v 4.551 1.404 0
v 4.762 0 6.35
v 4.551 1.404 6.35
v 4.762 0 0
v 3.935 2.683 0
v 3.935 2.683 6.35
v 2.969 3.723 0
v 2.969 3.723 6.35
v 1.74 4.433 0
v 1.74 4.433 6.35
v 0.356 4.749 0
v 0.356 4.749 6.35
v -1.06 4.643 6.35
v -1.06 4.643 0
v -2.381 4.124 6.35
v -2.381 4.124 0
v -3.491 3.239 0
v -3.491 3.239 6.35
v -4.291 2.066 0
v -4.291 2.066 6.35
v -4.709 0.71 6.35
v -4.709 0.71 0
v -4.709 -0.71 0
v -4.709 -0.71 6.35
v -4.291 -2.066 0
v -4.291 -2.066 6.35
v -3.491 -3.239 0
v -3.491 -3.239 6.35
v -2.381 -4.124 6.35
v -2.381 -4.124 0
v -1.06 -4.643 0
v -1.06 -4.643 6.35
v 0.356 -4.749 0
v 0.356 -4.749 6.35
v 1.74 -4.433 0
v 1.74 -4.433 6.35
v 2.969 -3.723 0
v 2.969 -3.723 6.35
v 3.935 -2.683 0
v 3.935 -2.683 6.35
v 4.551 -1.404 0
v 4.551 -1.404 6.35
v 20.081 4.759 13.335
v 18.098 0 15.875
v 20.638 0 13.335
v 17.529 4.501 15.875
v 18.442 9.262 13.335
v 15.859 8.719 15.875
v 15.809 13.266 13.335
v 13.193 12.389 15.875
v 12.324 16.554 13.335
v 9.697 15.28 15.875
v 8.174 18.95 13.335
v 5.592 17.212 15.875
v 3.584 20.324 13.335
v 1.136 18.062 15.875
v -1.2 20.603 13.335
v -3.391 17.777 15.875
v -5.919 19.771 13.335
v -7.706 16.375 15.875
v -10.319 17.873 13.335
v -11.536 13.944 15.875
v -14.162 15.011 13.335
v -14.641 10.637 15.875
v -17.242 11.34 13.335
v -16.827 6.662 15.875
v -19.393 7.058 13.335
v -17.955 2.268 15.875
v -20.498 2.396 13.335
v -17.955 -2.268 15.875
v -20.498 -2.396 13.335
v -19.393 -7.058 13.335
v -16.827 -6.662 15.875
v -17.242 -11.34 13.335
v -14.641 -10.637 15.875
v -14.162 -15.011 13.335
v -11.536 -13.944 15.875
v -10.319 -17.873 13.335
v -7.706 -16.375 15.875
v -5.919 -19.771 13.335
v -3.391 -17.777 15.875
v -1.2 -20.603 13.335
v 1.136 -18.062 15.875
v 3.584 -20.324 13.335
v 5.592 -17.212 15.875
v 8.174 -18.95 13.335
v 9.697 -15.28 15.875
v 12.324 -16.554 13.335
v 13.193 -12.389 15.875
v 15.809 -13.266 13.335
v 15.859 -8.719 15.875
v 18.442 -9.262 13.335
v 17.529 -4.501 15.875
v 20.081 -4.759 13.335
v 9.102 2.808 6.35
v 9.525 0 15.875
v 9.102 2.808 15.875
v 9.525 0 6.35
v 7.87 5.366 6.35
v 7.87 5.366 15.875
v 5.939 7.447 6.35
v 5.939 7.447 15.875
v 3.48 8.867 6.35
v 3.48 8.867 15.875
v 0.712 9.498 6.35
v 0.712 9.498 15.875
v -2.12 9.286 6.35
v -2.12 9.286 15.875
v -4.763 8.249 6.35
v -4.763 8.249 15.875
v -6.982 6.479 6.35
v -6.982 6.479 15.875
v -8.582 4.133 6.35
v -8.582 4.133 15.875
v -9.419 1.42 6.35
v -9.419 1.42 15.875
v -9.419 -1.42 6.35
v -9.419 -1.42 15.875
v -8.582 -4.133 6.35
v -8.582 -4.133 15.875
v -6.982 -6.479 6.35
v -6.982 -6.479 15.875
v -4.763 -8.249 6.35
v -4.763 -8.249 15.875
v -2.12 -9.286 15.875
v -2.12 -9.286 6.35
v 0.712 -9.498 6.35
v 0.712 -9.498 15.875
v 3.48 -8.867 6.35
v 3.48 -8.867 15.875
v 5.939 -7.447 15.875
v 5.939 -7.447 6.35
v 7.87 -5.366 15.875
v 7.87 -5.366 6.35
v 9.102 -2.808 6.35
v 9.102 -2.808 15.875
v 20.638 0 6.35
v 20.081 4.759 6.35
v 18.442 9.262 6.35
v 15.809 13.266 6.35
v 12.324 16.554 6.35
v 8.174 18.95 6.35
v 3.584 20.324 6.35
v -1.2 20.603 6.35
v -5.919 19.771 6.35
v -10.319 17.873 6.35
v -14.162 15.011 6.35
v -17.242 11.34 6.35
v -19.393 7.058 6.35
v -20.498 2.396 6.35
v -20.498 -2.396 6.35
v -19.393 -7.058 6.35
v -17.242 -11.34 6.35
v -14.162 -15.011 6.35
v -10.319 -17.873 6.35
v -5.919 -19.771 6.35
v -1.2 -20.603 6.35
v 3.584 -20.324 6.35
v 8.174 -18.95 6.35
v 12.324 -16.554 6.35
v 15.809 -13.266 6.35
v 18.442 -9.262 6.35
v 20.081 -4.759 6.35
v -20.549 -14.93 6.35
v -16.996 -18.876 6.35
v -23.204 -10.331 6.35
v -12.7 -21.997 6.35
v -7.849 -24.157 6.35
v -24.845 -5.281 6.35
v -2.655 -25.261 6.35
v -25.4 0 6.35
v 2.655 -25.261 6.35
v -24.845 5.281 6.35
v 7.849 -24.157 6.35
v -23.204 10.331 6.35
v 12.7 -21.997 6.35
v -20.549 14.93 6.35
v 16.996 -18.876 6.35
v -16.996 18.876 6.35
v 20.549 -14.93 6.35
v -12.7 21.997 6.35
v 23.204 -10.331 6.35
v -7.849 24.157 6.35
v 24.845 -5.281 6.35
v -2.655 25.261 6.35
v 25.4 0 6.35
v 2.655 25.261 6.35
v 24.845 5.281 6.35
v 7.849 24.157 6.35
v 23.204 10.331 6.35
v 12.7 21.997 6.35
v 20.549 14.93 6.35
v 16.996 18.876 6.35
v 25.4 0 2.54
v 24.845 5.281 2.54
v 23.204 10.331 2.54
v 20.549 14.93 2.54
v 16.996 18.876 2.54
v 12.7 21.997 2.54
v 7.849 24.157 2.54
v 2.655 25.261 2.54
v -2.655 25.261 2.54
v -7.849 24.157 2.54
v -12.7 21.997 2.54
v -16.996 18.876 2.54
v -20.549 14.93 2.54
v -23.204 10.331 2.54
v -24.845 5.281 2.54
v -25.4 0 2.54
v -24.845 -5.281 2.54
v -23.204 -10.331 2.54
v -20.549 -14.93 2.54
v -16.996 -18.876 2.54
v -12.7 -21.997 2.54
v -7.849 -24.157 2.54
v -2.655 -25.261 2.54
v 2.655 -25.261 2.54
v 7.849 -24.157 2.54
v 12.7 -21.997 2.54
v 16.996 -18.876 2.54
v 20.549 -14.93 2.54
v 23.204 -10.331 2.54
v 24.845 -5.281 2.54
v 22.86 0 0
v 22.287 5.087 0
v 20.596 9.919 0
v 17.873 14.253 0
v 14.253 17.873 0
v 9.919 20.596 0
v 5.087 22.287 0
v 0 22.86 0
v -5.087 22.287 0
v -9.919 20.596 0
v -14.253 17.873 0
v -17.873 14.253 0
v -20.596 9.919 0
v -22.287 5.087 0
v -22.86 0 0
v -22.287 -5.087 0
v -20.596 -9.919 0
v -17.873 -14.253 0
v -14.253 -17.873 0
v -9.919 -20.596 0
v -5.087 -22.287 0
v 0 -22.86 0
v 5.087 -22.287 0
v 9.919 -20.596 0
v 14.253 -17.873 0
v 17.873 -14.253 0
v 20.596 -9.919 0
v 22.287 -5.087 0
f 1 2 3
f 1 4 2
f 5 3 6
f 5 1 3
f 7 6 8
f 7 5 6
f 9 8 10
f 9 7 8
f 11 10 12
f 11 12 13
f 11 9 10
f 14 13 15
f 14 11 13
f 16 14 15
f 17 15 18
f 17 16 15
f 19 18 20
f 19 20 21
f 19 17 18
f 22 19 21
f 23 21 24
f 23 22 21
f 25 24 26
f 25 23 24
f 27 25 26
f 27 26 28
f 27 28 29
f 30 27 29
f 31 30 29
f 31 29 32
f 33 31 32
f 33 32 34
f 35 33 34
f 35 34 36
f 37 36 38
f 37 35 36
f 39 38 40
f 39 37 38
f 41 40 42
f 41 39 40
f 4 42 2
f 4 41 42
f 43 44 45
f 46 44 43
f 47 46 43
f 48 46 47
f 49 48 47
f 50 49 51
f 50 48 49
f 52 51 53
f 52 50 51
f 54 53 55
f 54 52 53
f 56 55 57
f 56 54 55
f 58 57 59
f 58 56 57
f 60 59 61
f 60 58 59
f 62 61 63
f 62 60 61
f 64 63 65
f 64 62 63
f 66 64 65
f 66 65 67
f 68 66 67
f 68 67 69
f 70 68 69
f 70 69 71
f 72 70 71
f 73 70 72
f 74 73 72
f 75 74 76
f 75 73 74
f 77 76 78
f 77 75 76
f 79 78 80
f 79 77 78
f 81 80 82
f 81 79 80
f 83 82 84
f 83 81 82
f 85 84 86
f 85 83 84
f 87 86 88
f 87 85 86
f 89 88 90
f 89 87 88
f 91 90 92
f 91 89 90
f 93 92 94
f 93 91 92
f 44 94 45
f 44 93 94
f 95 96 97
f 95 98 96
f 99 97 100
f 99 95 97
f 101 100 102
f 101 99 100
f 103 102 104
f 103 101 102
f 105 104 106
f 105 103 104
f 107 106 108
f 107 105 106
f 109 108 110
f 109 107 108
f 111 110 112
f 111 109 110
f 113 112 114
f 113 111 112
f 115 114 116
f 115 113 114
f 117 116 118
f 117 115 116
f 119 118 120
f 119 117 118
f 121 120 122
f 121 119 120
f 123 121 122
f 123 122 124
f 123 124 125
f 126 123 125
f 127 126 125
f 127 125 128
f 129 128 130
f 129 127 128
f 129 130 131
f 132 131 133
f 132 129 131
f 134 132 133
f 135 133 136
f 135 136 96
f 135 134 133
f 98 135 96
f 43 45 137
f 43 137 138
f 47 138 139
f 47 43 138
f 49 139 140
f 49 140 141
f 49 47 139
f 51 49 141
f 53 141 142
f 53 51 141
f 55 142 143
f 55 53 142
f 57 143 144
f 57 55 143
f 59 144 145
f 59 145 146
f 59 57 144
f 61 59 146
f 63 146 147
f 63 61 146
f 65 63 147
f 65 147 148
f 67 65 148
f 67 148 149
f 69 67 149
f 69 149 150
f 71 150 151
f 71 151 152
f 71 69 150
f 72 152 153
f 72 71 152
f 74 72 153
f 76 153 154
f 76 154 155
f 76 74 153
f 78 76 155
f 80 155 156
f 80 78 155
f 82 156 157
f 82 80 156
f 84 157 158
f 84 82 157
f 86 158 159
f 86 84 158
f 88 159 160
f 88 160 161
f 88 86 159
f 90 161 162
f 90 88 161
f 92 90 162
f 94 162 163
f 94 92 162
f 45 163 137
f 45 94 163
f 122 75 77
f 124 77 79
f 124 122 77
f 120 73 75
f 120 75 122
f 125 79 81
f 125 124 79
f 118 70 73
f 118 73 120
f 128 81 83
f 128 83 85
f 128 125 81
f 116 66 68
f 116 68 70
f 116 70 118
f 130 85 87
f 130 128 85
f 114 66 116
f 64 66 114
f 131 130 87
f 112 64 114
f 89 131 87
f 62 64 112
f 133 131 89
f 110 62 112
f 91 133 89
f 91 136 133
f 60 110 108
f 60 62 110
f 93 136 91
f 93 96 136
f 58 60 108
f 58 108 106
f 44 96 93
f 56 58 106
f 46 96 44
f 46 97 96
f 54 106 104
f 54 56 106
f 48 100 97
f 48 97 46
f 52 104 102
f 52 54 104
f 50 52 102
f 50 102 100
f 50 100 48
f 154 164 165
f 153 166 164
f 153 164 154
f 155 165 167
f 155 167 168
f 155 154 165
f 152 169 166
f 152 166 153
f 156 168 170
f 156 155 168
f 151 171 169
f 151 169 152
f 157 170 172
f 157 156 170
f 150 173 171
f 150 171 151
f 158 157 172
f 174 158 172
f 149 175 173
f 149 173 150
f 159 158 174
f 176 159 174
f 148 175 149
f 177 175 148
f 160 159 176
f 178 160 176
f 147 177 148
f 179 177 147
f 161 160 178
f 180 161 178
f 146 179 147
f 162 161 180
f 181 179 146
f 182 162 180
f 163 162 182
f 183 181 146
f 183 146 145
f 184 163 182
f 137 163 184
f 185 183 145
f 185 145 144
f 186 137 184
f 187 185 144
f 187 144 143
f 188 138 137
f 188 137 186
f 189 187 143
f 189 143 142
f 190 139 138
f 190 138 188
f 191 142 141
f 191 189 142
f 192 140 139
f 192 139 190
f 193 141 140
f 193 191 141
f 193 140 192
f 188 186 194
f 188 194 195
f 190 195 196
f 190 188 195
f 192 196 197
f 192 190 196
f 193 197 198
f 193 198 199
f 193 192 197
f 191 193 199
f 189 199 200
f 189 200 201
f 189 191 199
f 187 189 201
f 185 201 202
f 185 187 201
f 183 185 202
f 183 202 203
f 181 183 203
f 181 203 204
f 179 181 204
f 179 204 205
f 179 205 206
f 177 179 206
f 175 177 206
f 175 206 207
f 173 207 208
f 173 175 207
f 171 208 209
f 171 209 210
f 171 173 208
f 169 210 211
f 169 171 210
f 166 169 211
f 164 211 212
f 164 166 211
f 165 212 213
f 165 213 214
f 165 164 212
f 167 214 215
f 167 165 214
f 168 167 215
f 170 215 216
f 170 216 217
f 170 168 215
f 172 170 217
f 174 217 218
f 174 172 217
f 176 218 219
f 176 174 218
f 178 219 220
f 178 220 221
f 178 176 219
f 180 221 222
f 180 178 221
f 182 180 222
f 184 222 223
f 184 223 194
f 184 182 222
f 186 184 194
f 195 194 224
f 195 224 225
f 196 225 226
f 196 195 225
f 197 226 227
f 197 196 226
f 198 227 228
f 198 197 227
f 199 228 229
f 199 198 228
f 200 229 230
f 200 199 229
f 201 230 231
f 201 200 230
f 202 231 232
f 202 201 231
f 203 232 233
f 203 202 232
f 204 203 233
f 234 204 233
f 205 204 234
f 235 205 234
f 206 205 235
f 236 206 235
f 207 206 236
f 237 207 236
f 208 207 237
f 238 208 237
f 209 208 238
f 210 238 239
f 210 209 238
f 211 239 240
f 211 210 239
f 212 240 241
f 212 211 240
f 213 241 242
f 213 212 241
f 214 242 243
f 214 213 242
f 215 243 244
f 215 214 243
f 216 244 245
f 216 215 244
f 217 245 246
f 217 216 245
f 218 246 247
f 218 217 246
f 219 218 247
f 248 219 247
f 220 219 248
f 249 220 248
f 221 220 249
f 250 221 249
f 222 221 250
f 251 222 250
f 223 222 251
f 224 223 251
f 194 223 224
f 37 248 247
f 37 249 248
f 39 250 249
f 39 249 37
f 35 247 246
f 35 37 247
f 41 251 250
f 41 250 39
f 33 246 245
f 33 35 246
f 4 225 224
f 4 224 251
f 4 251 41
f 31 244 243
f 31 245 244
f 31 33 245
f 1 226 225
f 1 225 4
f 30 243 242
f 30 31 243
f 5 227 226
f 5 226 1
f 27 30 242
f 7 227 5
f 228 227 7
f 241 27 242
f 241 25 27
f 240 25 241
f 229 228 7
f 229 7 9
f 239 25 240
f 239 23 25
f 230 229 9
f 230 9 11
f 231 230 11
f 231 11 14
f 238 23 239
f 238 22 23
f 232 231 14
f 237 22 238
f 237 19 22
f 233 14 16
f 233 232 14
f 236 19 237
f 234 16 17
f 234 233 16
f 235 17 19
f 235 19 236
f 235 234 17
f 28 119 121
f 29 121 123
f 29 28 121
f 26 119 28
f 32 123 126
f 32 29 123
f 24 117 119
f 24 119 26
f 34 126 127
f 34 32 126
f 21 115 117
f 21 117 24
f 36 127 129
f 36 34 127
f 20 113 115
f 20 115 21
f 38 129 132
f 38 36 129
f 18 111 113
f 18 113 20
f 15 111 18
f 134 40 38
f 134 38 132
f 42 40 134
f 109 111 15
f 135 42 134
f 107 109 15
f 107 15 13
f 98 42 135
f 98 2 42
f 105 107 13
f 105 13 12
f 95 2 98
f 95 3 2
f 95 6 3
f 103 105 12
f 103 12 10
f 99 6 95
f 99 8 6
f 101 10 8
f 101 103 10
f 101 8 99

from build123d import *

# Parameters (mm, degrees)
F2_SIZE2 = 2.54
F2_SIZE  = 2.54


with BuildPart() as f1:
    # F0 (on Front) → F1 (revolve)
    with BuildSketch(Plane.XZ):
        Polygon((4.7625, 0), (25.4, 0), (25.4, 6.35), (20.6375, 6.35), (20.6375, 15.875), (9.525, 15.875), (9.525, 6.35), (4.7625, 6.35), align=None)
    revolve(axis=Axis((0, 0, 16.889236), (0, 0, 1)))

    # F2
    f2_edges = [f1.edges().sort_by_distance(p)[0] for p in [
        (-20.6375, 0, 15.875),
        (-25.4, 0, 0),
    ]]
    chamfer(f2_edges, length=F2_SIZE, length2=F2_SIZE2)


solid = f1.part
